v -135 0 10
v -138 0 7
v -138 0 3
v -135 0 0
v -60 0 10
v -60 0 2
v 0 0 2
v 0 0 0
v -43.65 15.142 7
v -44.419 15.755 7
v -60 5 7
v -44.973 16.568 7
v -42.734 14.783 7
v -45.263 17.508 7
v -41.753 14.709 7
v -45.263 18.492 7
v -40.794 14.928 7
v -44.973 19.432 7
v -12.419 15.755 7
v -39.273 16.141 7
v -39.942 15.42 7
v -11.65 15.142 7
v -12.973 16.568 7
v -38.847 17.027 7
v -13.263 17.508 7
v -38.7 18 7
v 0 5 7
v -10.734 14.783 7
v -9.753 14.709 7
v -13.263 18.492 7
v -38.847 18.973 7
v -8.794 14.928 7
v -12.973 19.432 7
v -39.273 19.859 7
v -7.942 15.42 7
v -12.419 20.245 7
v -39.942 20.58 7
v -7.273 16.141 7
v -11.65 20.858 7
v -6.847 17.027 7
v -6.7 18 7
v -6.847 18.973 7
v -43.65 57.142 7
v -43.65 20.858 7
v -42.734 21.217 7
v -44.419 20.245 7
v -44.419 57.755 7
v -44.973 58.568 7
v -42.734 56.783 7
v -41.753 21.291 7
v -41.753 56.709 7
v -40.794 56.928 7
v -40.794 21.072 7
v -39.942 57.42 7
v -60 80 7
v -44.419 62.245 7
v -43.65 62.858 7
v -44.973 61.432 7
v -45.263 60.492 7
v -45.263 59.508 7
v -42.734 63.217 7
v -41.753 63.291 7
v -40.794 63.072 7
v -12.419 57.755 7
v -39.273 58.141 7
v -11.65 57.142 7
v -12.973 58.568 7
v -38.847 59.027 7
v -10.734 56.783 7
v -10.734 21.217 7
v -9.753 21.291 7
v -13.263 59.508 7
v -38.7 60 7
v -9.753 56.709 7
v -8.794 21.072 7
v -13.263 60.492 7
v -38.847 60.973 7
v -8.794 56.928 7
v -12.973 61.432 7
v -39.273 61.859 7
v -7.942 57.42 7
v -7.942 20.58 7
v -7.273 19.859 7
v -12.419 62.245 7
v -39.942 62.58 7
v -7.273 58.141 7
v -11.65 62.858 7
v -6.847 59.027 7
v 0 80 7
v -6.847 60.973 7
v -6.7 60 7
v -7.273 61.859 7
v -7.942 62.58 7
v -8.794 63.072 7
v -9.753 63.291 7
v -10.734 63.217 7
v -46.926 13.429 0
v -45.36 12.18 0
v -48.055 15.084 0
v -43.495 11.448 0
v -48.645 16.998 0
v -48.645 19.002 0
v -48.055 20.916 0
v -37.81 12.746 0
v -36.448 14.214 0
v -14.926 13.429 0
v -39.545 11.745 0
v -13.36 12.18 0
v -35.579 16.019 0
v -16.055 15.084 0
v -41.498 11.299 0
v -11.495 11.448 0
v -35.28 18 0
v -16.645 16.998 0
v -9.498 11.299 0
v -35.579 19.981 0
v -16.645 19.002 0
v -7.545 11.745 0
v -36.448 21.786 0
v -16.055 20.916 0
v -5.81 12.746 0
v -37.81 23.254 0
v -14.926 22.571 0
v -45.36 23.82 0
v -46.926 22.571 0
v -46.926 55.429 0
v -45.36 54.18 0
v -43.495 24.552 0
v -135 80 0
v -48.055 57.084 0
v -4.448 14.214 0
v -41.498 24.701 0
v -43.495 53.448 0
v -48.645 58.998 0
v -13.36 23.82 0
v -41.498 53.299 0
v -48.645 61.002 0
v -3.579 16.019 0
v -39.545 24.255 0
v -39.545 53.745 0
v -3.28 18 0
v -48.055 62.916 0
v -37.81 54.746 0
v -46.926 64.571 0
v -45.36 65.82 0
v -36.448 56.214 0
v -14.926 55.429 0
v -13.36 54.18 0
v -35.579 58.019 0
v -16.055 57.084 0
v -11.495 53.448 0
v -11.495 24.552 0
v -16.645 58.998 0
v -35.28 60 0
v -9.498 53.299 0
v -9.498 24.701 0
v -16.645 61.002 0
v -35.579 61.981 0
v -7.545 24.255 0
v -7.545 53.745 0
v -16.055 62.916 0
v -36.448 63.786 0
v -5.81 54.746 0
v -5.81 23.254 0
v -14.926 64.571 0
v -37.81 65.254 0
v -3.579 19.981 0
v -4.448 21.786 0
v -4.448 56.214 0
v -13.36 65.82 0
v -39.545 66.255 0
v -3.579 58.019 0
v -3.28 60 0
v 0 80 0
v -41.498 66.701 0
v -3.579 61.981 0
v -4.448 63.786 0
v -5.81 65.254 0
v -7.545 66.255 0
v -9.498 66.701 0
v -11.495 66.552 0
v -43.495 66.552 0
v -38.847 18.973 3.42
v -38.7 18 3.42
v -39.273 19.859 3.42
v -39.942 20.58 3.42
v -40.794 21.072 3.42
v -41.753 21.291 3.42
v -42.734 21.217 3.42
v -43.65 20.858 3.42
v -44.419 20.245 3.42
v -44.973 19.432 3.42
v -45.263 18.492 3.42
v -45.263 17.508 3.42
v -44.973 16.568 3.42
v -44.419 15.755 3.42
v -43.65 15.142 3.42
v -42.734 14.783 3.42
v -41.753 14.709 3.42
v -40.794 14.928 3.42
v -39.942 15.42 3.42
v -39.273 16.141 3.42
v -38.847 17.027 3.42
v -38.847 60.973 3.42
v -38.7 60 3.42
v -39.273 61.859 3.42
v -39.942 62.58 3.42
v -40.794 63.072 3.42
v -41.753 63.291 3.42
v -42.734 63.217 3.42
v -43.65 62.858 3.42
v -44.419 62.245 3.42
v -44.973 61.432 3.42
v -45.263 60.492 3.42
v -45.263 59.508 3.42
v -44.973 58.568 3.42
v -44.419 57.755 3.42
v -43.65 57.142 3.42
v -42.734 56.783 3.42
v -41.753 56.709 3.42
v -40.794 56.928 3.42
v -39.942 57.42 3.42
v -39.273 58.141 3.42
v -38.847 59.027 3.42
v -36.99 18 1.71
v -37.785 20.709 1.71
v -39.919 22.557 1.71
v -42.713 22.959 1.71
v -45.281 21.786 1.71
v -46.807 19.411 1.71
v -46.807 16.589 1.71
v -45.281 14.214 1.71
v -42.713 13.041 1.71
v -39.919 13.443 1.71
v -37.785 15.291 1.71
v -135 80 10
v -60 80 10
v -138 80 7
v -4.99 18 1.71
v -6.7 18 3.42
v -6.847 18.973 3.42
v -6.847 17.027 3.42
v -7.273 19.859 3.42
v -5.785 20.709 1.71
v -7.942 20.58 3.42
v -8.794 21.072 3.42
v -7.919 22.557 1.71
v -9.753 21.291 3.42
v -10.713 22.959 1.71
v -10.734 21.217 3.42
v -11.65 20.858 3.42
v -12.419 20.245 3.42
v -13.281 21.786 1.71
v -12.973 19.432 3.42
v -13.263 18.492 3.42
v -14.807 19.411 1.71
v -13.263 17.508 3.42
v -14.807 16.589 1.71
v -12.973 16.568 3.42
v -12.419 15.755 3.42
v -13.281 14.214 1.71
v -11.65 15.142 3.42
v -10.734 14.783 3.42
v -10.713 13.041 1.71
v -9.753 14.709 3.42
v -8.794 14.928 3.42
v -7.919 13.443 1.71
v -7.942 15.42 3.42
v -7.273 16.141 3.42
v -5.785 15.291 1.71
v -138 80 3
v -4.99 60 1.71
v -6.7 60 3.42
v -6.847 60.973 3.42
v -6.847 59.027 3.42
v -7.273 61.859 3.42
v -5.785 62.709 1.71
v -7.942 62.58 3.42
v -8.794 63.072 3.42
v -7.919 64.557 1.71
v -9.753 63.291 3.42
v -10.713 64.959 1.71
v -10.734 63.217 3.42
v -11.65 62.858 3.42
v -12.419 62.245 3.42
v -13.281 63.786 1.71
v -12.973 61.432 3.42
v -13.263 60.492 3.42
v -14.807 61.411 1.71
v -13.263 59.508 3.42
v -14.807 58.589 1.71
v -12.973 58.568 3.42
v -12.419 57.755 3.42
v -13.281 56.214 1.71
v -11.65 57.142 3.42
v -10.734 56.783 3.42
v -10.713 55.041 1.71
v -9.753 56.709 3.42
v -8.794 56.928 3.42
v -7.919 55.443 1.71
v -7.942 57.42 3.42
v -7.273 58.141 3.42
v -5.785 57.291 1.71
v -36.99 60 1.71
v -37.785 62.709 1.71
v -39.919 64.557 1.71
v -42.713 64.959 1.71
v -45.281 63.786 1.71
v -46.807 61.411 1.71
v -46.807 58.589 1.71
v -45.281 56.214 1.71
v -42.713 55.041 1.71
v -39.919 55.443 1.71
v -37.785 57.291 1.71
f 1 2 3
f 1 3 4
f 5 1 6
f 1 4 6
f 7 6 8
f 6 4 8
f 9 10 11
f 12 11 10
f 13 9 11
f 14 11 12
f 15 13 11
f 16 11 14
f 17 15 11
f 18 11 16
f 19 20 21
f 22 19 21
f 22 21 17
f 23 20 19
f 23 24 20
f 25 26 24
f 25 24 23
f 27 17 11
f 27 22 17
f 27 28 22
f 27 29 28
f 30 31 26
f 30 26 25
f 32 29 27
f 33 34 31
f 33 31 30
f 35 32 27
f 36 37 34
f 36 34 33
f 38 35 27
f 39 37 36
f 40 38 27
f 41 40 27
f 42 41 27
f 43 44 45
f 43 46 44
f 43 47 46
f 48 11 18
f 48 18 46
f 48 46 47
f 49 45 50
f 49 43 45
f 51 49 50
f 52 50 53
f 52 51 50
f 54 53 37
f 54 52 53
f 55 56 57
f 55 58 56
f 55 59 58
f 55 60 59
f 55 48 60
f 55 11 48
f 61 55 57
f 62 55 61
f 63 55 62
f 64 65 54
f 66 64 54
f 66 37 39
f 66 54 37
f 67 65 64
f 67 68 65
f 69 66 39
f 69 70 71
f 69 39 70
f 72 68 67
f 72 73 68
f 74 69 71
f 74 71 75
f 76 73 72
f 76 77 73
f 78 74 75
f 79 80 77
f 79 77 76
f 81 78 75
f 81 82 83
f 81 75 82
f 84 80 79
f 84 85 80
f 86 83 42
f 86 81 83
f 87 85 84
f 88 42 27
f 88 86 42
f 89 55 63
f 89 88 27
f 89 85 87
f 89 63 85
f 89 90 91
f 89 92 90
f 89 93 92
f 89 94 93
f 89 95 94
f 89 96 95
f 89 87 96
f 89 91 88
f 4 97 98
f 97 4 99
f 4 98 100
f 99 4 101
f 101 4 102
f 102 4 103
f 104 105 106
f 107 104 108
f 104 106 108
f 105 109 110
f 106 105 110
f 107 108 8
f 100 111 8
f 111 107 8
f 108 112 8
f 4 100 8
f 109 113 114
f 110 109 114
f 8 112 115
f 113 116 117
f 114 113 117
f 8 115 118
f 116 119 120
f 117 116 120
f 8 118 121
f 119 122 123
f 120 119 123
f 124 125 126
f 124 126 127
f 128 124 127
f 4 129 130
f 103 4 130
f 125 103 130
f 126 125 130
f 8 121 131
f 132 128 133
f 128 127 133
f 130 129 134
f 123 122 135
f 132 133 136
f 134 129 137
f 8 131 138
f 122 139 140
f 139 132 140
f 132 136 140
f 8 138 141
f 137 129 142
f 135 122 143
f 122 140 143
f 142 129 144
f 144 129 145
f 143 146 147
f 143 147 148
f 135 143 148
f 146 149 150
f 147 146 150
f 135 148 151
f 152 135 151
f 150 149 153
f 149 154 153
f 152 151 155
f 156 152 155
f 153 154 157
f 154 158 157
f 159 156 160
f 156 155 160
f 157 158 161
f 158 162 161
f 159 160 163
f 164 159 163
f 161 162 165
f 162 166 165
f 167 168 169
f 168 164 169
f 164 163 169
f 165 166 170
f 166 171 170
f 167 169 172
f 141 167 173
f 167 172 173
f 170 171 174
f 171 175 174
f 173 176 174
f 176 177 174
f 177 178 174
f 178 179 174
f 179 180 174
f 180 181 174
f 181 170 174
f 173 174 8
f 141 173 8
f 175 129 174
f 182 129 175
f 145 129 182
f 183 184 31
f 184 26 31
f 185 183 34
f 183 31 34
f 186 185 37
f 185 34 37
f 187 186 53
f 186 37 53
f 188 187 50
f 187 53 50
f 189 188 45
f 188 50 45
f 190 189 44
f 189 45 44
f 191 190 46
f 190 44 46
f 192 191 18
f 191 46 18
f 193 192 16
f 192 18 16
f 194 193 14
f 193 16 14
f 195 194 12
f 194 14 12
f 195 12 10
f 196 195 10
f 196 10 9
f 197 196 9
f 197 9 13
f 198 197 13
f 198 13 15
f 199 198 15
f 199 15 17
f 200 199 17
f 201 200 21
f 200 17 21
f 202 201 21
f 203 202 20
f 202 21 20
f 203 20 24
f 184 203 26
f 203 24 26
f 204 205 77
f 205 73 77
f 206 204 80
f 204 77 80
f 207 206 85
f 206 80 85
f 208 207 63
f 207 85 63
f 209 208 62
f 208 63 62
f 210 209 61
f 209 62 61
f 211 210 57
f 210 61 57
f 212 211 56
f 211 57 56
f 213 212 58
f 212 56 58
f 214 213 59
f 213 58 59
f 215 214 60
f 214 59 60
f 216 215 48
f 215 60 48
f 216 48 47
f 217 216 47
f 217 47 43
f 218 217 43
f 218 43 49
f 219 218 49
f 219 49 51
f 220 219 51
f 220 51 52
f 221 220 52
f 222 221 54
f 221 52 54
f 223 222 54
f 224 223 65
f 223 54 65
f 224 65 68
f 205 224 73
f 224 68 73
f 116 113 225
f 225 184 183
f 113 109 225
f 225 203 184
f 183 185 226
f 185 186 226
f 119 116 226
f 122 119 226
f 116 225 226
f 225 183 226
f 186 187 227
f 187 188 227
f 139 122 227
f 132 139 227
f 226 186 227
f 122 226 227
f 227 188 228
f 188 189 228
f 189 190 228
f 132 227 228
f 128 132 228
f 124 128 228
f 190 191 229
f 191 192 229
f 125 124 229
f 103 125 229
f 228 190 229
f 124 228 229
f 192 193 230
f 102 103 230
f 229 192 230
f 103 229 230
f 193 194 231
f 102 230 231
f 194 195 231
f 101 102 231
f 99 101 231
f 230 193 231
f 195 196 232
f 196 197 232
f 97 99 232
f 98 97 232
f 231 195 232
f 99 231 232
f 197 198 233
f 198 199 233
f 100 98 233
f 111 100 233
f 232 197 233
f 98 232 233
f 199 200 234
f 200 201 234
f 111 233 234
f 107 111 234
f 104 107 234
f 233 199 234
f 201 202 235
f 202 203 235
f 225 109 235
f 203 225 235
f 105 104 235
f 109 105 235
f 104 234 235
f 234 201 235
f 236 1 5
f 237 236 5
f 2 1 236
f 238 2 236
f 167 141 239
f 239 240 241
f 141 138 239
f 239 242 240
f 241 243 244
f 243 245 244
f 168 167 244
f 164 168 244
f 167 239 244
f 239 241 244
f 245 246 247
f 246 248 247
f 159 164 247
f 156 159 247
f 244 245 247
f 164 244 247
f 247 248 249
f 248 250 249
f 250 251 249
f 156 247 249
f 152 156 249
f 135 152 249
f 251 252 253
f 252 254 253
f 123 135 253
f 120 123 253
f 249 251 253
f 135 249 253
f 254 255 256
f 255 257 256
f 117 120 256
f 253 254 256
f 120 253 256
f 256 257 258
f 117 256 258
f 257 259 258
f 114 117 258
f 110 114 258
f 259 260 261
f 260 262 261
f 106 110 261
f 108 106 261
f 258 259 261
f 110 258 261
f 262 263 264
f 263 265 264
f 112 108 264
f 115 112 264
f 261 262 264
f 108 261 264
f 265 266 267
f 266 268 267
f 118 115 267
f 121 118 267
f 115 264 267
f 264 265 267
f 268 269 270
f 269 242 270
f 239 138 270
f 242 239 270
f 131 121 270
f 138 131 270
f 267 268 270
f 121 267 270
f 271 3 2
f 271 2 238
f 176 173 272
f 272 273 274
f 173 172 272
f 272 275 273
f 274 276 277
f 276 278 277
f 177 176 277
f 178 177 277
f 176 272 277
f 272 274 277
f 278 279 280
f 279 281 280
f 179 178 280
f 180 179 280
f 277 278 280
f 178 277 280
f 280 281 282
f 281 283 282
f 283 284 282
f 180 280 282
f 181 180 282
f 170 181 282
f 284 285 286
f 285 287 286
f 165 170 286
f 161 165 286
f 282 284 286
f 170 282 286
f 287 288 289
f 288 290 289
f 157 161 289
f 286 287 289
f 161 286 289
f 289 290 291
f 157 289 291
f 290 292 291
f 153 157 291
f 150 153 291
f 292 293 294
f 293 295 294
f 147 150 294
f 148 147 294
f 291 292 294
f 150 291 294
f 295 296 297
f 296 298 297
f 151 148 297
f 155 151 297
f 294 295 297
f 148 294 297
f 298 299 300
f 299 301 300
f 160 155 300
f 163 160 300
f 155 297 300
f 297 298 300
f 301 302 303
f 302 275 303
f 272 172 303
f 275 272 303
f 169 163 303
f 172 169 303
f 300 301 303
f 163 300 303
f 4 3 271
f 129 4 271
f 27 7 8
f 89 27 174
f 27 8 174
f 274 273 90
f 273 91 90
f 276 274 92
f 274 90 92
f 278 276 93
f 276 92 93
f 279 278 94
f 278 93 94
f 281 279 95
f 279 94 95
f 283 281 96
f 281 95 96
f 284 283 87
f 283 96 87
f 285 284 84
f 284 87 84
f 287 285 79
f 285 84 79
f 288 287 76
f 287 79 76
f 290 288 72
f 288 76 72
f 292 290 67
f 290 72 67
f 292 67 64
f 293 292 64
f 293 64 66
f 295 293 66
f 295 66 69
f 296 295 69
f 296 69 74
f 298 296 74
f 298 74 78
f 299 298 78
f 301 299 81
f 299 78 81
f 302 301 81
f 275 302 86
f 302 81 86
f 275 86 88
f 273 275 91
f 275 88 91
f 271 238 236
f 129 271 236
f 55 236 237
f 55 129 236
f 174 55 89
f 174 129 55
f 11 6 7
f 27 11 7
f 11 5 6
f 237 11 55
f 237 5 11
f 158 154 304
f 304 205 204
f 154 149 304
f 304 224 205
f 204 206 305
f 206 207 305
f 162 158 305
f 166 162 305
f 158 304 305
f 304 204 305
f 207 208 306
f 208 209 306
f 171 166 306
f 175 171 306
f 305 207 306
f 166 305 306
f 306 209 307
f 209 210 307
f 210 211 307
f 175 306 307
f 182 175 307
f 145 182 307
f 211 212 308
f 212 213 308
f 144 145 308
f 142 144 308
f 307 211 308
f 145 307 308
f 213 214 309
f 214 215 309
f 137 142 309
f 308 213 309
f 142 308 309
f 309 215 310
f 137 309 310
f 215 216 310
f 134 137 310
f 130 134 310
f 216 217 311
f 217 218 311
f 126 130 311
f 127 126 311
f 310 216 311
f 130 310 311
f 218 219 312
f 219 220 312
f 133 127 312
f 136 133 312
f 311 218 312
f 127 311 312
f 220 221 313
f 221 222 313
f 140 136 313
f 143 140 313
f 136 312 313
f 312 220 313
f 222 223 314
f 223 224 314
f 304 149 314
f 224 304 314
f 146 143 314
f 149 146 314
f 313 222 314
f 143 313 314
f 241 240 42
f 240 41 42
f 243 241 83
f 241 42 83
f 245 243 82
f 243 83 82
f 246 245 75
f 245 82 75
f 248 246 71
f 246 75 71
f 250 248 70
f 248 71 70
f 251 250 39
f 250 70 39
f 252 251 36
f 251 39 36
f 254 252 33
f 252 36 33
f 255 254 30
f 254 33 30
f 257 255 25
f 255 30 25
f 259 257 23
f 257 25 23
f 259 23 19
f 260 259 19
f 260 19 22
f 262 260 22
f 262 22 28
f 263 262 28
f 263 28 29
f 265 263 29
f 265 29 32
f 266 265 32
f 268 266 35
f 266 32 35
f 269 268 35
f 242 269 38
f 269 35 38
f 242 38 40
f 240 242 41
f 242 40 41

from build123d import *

# Parameters (mm, degrees)
ESBO_O1_W                                           = 138
ESBO_O1_H                                           = 80
RESSALTO_EXTRUS_O1_DEPTH                            = 10
ESBO_O2_W                                           = 60
ESBO_O2_H                                           = 80
CORTE_EXTRUS_O1_DEPTH                               = 3
ESCAREADO_PARA_PARAFUSO_ALLEN_SEXTAVADO_D           = 6.6
ESCAREADO_PARA_PARAFUSO_ALLEN_SEXTAVADO_CSINK_D     = 13.44
ESCAREADO_PARA_PARAFUSO_ALLEN_SEXTAVADO_CSINK_ANGLE = 90
CHANFRO1_SIZE                                       = 5
CHANFRO2_SIZE                                       = 3


with BuildPart() as part:
    # Esboço1 → Ressalto-extrusão1 (new body)
    with BuildSketch(Plane.XY):
        with Locations((-69, 40)):
            Rectangle(ESBO_O1_W, ESBO_O1_H)
    extrude(amount=RESSALTO_EXTRUS_O1_DEPTH)

    # Esboço2 → Corte-extrusão1 (cut)
    with BuildSketch(Plane.XY.offset(10)):
        with Locations((-30, 40)):
            Rectangle(ESBO_O2_W, ESBO_O2_H)
    extrude(amount=-CORTE_EXTRUS_O1_DEPTH, mode=Mode.SUBTRACT)

    # Escareado para parafuso Allen sextavado escareado de M62 (through all)
    with Locations(Plane(origin=(0, 0, 0), x_dir=(-1, 0, 0), z_dir=(0, 0, -1))):
        with Locations((10, 60), (42, 60), (42, 18), (10, 18)):
            CounterSinkHole(ESCAREADO_PARA_PARAFUSO_ALLEN_SEXTAVADO_D / 2, ESCAREADO_PARA_PARAFUSO_ALLEN_SEXTAVADO_CSINK_D / 2, counter_sink_angle=ESCAREADO_PARA_PARAFUSO_ALLEN_SEXTAVADO_CSINK_ANGLE)

    # Chanfro1
    chanfro1_edges = [part.edges().sort_by_distance(p)[0] for p in [
        (-30, 0, 7),
    ]]
    chamfer(chanfro1_edges, length=CHANFRO1_SIZE)

    # Chanfro2
    chanfro2_edges = [part.edges().sort_by_distance(p)[0] for p in [
        (-138, 40, 10),
        (-138, 40, 0),
    ]]
    chamfer(chanfro2_edges, length=CHANFRO2_SIZE)


solid = part.part
